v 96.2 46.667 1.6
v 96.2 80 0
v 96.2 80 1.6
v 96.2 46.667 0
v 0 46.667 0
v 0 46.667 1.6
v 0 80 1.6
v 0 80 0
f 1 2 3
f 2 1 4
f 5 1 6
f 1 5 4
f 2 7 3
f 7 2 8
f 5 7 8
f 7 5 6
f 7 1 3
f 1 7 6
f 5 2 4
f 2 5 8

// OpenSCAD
breadth = 100;
depth = 20;

height = breadth;
wall = 2;
slope = 4.3987;

notch = wall/4;
slot = wall;
slath = height/3;
thin = 0.8;
give = .4;

buttspan = .1875 * breadth * 4;
butttail = 1.4 * depth * 2;
buttslope = 1.27*45;

*union() {
    cube([breadth,depth,wall]);

    
difference() {
union() {
    translate([wall,0,0]) rotate([slope,0,0]) cube([breadth-(wall-notch)*2,slot,slath]);
    
    translate([wall,wall*2,0]) rotate([slope,0,0]) cube([breadth-(wall-notch)*2,thin,slath]);
    }

    translate([0,-wall*2,wall*2]) translate([wall*2,0,0]) rotate([slope,0,0]) color([0.7,0.3,0.3]) cube([breadth-(wall-notch)*5,wall*5,slath-wall]);
}
    
    

difference() {
union() {
    translate([wall,depth-wall,0]) rotate([slope,0,0]) cube([breadth-(wall-notch)*2,slot,slath]);
    
    translate([wall,depth-wall*2-thin,0]) rotate([slope,0,0]) cube([breadth-(wall-notch)*2,thin,slath]);   
    
    }
    
    translate([0,-wall*2,wall*2]) translate([wall*2,depth-wall,0]) rotate([slope,0,0]) color([0.7,0.3,0.3]) cube([breadth-(wall-notch)*5,wall*3,slath-wall]);
}

        
    
difference() {
    union() { 

        rotate([slope,0,0]) cube([wall,depth,height]);
        translate([breadth-wall,0,0]) rotate([slope,0,0]) cube([wall,depth,height]);

        translate([breadth/2-buttspan/4,butttail/3,-butttail*sqrt(2)/2]) rotate([buttslope,0,0]) color([1,0,0]) cube([buttspan/2,butttail,butttail]);
    }
    
        translate([breadth/2-buttspan/2,wall,-wall*2]) color([0,.5,.5]) rotate([slope,0,0]) cube(buttspan, butttail, butttail);
   
        translate([breadth/2-buttspan/2,-buttspan/1.25,-buttspan*1.5]) color([0,.5,.5]) cube([buttspan, buttspan*1.5,buttspan*1.5]);
    
    translate([wall-notch,wall,wall-notch]) color([0,0,1]) rotate([slope,0,0]) cube([breadth-(wall-notch)*2,slot,height]);
    
    translate([wall-notch,depth-wall*2,wall-notch]) color([0,0,1]) rotate([slope,0,0]) cube([breadth-(wall-notch)*2,slot,height]);
}

}

length = breadth-(wall-notch+give)*2;

*render() {
translate([breadth*1.5,height*2,0]) { 

sten = "hacktower.png";
stenw = 202;
stenh = 599;
tower = length/stenw*stenh;
scale = tower/stenh*.95;
grays = 1/256;
hollow = wall-1.5;
    
echo(hollow);

    union()    {
    difference() {
        rotate([90,0,0]) color([0,1,0]) cube([length,slot-give,tower]);

        translate([breadth-breadth*.975,-tower*.975,wall-hollow+1]) scale([scale,scale,grays*wall*slot*2]) surface(file=sten, invert=true); 
    }
    
    for(i = [18:20:tower*.8]) {
    translate([i<tower*.6?0:length*.3,i-tower,0]) color([.5,0,.5]) cube([i<tower*.6?length:(length*.4), thin, thin]);
    }
    
    translate([0,25-tower,0]) color([.5,0,.5]) cube([length, thin, thin]);
    
    translate([length/2+.5,-tower*.341,0]) color([.5,0,.5]) cube([thin,15,thin]);
}
}
}

render() {
translate([0,depth*4,0]) { 

sten = "test.png";
stenw = 400;
stenh = 400;
scale = slath/stenh*.9;
grays = 1/256;
hollow = wall-1.5;
echo(hollow);

    difference() {
        rotate([90,0,0]) color([0,1,0]) cube([length,slot-give,slath]);

        translate([length/2-stenh*scale/2,-slath*.95,wall-hollow+1]) scale([scale,scale,grays*wall*slot*2]) surface(file=sten, invert=true); 
    }
}
}
